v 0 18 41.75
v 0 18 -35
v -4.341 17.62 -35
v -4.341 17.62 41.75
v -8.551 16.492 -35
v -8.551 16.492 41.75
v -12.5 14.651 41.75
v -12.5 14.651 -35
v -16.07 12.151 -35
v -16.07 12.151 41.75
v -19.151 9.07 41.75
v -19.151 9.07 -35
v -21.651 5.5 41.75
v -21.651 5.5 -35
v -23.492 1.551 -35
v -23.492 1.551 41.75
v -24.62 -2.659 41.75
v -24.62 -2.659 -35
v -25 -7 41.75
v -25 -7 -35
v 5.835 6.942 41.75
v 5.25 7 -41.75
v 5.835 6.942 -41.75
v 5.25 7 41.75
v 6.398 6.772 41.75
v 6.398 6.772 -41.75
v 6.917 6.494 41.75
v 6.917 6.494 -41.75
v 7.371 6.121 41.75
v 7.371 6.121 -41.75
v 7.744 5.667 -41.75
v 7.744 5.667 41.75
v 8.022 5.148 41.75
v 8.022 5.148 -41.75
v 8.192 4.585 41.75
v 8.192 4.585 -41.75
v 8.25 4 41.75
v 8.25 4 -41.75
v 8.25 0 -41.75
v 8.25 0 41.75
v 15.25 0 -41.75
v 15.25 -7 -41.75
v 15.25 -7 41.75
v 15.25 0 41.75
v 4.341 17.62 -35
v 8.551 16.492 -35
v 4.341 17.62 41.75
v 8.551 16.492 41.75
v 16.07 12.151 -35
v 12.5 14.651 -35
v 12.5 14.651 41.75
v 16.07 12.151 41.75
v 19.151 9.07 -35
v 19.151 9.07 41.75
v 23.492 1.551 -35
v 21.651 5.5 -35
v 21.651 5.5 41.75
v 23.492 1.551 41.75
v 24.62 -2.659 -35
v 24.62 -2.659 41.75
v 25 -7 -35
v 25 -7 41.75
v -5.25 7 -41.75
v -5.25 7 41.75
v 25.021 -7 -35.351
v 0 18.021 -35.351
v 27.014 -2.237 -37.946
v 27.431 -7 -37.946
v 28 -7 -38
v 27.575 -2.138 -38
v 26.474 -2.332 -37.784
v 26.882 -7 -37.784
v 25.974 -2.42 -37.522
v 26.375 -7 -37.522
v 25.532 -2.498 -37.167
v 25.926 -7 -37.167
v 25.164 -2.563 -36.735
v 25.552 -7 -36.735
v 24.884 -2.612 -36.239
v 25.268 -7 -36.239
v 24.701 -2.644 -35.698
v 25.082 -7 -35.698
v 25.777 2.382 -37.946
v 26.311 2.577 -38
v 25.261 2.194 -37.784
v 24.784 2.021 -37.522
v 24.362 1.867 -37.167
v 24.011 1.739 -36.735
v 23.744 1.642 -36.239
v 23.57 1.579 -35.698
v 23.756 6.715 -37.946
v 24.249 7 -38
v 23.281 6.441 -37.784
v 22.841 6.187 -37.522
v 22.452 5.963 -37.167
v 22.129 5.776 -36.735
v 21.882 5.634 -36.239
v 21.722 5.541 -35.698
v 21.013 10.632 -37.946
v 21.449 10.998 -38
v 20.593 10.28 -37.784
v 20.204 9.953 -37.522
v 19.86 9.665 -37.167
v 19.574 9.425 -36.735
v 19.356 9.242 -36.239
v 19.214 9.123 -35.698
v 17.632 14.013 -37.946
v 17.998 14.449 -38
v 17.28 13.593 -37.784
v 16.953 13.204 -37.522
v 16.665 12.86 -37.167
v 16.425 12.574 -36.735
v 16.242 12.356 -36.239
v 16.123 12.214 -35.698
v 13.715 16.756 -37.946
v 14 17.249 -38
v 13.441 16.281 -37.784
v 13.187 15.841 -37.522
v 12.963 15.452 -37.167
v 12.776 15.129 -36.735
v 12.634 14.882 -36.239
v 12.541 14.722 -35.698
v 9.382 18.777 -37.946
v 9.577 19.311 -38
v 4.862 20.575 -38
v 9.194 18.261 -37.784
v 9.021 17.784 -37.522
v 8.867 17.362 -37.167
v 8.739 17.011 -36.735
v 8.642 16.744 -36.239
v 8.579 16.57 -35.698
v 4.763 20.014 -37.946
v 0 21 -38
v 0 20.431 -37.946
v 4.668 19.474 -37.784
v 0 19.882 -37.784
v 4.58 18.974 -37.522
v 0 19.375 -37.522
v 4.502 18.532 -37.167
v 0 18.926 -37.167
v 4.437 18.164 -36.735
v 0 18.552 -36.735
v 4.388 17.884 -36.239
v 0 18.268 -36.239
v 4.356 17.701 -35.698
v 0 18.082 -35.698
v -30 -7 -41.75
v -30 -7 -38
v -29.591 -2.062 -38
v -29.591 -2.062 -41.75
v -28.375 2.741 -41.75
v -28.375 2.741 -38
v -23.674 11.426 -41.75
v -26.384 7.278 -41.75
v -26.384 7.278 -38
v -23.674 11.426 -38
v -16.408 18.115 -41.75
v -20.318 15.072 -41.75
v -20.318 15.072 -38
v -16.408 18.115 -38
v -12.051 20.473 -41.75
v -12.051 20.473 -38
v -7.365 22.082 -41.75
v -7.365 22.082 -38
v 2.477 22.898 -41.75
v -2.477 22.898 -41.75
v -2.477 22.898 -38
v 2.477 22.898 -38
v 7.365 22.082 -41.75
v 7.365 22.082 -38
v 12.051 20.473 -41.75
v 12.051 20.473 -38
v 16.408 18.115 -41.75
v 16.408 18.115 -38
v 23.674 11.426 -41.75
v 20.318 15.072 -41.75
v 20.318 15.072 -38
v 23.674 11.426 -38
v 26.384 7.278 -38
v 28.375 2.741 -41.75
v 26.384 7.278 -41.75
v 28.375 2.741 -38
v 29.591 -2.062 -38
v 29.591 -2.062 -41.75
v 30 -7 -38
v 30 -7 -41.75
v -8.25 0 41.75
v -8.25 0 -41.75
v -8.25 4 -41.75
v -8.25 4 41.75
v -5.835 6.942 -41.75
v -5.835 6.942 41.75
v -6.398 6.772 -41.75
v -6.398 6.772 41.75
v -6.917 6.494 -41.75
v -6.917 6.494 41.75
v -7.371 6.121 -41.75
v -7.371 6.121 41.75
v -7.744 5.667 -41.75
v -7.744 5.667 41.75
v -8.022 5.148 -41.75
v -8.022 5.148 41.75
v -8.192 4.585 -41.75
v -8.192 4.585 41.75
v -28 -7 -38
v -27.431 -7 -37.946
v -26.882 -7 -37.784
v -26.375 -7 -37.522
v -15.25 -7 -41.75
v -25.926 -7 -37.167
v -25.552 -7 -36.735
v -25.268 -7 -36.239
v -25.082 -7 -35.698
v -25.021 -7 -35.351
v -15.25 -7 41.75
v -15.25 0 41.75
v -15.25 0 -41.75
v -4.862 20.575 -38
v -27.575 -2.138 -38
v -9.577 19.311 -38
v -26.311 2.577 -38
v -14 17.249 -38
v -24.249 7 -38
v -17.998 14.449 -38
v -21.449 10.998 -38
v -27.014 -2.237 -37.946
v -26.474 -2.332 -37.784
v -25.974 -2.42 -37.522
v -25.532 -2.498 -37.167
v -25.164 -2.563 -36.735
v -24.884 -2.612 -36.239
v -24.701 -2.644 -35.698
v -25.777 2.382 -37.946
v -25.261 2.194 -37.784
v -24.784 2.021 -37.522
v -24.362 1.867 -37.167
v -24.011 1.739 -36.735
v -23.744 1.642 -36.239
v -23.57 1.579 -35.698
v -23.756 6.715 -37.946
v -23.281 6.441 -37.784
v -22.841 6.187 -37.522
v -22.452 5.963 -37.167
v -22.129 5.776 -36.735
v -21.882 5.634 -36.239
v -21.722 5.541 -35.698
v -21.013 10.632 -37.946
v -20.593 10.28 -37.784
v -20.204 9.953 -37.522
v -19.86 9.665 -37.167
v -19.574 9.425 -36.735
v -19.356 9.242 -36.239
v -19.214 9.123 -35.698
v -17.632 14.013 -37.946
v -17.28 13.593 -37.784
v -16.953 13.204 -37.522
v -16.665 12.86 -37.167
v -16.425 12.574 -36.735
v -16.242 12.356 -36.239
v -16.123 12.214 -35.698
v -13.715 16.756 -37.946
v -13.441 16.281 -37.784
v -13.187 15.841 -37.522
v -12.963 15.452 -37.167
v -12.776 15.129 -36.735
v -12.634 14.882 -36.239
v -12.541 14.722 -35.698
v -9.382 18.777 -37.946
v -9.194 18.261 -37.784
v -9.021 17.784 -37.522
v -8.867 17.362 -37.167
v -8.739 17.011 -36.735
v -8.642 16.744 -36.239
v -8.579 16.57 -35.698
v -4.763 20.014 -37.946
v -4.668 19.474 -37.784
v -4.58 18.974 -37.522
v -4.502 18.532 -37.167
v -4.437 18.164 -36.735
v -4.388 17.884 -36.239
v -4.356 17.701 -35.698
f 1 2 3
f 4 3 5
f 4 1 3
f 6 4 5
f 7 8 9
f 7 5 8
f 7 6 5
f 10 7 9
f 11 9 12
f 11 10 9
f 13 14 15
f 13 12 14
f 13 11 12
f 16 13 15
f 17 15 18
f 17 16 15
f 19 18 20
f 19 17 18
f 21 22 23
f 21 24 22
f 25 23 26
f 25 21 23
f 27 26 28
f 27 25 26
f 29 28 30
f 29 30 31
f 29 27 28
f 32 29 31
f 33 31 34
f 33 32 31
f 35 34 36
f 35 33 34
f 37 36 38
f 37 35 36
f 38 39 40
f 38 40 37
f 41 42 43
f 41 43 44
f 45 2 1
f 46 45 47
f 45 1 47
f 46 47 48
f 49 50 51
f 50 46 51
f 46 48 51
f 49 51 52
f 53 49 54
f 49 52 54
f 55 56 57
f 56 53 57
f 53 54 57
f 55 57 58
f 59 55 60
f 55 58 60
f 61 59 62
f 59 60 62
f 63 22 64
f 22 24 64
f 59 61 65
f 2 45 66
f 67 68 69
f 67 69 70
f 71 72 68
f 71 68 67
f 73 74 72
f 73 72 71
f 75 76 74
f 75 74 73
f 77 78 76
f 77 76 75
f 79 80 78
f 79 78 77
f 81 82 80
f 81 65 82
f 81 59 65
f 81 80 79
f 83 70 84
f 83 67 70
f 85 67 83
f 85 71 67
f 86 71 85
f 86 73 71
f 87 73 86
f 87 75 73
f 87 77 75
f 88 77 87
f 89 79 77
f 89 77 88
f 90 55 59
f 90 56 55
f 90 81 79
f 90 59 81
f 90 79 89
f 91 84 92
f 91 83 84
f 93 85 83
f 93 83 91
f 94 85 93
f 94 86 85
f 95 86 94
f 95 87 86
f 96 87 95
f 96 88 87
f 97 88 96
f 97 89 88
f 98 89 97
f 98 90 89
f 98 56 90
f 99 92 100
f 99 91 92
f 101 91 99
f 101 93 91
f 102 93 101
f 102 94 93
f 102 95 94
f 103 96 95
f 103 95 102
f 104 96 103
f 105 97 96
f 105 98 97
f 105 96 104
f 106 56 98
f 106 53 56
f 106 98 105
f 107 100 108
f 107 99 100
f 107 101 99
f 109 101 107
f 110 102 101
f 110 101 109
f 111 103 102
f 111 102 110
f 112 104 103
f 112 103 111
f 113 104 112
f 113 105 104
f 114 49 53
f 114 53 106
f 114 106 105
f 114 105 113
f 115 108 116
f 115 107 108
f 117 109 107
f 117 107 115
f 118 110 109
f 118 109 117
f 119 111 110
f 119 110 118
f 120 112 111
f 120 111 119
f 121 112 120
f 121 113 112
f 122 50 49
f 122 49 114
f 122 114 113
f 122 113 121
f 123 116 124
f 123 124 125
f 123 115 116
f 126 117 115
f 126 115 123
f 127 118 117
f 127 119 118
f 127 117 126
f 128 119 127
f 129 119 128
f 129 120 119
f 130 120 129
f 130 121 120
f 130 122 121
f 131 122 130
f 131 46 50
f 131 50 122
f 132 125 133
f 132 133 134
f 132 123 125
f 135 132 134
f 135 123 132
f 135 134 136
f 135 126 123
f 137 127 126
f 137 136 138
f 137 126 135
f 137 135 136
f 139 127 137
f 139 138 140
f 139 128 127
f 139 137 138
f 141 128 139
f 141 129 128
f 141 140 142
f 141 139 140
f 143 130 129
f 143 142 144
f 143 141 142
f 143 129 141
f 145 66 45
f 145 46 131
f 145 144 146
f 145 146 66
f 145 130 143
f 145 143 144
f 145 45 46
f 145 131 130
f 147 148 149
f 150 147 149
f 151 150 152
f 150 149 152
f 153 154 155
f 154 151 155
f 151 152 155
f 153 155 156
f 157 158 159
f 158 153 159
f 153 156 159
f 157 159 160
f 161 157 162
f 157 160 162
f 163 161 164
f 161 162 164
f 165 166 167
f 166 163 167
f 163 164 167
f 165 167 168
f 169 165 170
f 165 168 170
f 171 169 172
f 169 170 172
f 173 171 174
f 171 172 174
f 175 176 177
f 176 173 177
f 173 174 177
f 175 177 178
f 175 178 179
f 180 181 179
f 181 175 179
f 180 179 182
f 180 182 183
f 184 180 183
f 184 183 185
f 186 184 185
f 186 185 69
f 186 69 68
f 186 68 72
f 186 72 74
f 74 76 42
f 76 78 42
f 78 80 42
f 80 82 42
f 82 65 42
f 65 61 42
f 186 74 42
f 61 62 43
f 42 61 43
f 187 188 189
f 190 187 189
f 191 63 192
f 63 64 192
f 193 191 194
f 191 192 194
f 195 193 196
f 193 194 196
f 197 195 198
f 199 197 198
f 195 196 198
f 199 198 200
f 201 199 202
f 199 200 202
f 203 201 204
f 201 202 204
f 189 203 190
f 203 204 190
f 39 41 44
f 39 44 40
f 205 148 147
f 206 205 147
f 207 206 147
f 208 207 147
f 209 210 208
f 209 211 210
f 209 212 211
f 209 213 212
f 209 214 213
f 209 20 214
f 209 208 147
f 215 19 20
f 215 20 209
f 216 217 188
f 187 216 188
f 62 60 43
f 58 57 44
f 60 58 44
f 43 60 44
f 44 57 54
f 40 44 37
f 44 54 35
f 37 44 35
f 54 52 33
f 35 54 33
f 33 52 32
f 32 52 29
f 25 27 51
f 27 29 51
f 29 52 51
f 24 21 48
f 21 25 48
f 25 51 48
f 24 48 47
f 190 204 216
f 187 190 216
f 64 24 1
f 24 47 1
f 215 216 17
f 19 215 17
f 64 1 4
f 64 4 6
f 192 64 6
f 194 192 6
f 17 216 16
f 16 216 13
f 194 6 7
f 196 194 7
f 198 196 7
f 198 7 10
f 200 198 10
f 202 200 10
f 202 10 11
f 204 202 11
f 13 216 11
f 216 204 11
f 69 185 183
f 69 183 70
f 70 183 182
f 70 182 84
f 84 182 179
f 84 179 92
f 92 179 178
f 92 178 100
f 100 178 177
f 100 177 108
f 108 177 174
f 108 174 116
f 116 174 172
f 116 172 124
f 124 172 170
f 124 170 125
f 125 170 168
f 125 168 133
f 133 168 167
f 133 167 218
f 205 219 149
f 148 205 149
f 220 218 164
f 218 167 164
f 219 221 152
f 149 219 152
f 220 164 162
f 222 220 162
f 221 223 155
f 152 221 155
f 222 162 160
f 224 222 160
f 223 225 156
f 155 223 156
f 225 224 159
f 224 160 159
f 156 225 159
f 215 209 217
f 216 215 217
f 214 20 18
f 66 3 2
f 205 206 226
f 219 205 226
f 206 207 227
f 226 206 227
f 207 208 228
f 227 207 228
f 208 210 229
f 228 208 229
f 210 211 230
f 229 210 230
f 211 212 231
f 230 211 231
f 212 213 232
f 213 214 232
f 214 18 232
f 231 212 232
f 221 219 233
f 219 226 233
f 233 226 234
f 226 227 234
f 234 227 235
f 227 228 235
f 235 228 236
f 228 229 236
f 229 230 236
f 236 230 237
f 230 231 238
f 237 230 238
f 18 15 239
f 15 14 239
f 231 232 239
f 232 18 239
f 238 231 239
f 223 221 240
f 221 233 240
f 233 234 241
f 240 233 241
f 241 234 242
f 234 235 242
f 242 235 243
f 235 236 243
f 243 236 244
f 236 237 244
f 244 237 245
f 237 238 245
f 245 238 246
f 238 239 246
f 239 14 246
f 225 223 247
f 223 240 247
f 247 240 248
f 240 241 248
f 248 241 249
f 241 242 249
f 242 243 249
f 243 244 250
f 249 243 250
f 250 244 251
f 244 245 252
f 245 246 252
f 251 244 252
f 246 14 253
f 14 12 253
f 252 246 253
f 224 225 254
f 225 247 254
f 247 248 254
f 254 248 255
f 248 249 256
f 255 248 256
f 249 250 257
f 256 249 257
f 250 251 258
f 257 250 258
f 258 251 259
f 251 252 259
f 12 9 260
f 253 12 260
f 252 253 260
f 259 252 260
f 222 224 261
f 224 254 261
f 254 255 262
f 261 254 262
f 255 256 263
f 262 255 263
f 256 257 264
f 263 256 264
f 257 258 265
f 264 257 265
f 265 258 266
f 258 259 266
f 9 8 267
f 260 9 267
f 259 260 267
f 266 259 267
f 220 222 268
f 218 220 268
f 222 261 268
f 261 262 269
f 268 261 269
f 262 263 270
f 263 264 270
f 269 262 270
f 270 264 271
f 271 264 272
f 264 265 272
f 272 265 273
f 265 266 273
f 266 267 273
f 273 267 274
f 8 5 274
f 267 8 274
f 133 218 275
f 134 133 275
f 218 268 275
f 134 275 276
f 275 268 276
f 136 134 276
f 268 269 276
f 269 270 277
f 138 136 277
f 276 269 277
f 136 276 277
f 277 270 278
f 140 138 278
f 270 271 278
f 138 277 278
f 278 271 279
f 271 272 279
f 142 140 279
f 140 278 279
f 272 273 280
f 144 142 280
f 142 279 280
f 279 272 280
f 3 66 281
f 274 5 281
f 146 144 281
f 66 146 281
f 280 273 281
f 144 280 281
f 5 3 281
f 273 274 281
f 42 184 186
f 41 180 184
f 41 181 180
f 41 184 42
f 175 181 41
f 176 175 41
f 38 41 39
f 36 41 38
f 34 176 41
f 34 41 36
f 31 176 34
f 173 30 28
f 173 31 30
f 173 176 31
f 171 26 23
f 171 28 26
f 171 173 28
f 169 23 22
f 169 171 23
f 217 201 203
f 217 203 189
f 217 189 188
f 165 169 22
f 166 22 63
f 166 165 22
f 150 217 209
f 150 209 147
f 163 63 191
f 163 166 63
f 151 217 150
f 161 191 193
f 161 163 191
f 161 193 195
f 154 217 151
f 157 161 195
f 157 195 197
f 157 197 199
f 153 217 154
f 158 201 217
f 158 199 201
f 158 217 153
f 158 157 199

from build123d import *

# Parameters (mm, degrees)
F1_DEPTH = 41.75
F2_START = -38
F2_DEPTH = 3.75
F3_R     = 3


with BuildPart() as f1:
    # F0 (on Top) → F1 (new body, symmetric)
    with BuildSketch(Plane.XY):
        with BuildLine():
            Line((-25, -7), (-15.25, -7))
            Line((-15.25, -7), (-15.25, 0))
            Line((-15.25, 0), (-8.25, 0))
            Line((-8.25, 0), (-8.25, 7))
            Line((-8.25, 7), (0, 7))
            Line((0, 7), (0, 18))
            ThreePointArc((0, 18), (-17.6776695297, 10.6776695297), (-25, -7))
        make_face()
    extrude(amount=F1_DEPTH, both=True)

    # F0 (on Top) → F2 (join)
    with BuildSketch(Plane.XY.offset(F2_START)):
        with BuildLine():
            Line((-30, -7), (-25, -7))
            ThreePointArc((-25, -7), (-17.6776695297, 10.6776695297), (0, 18))
            Line((0, 18), (0, 23))
            ThreePointArc((0, 23), (-21.2132034356, 14.2132034356), (-30, -7))
        make_face()
    extrude(amount=-F2_DEPTH)

    # F3
    f3_edges = [f1.edges().sort_by_distance(p)[0] for p in [
        (-8.25, 7, 0),
        (-17.67767, 10.67767, -38),
    ]]
    fillet(f3_edges, radius=F3_R)

    # F4: F1 across plane


with BuildPart() as f1_1:
    add(f1.part)
    add(f1.part.mirror(Plane.YZ))


solid = f1_1.part
